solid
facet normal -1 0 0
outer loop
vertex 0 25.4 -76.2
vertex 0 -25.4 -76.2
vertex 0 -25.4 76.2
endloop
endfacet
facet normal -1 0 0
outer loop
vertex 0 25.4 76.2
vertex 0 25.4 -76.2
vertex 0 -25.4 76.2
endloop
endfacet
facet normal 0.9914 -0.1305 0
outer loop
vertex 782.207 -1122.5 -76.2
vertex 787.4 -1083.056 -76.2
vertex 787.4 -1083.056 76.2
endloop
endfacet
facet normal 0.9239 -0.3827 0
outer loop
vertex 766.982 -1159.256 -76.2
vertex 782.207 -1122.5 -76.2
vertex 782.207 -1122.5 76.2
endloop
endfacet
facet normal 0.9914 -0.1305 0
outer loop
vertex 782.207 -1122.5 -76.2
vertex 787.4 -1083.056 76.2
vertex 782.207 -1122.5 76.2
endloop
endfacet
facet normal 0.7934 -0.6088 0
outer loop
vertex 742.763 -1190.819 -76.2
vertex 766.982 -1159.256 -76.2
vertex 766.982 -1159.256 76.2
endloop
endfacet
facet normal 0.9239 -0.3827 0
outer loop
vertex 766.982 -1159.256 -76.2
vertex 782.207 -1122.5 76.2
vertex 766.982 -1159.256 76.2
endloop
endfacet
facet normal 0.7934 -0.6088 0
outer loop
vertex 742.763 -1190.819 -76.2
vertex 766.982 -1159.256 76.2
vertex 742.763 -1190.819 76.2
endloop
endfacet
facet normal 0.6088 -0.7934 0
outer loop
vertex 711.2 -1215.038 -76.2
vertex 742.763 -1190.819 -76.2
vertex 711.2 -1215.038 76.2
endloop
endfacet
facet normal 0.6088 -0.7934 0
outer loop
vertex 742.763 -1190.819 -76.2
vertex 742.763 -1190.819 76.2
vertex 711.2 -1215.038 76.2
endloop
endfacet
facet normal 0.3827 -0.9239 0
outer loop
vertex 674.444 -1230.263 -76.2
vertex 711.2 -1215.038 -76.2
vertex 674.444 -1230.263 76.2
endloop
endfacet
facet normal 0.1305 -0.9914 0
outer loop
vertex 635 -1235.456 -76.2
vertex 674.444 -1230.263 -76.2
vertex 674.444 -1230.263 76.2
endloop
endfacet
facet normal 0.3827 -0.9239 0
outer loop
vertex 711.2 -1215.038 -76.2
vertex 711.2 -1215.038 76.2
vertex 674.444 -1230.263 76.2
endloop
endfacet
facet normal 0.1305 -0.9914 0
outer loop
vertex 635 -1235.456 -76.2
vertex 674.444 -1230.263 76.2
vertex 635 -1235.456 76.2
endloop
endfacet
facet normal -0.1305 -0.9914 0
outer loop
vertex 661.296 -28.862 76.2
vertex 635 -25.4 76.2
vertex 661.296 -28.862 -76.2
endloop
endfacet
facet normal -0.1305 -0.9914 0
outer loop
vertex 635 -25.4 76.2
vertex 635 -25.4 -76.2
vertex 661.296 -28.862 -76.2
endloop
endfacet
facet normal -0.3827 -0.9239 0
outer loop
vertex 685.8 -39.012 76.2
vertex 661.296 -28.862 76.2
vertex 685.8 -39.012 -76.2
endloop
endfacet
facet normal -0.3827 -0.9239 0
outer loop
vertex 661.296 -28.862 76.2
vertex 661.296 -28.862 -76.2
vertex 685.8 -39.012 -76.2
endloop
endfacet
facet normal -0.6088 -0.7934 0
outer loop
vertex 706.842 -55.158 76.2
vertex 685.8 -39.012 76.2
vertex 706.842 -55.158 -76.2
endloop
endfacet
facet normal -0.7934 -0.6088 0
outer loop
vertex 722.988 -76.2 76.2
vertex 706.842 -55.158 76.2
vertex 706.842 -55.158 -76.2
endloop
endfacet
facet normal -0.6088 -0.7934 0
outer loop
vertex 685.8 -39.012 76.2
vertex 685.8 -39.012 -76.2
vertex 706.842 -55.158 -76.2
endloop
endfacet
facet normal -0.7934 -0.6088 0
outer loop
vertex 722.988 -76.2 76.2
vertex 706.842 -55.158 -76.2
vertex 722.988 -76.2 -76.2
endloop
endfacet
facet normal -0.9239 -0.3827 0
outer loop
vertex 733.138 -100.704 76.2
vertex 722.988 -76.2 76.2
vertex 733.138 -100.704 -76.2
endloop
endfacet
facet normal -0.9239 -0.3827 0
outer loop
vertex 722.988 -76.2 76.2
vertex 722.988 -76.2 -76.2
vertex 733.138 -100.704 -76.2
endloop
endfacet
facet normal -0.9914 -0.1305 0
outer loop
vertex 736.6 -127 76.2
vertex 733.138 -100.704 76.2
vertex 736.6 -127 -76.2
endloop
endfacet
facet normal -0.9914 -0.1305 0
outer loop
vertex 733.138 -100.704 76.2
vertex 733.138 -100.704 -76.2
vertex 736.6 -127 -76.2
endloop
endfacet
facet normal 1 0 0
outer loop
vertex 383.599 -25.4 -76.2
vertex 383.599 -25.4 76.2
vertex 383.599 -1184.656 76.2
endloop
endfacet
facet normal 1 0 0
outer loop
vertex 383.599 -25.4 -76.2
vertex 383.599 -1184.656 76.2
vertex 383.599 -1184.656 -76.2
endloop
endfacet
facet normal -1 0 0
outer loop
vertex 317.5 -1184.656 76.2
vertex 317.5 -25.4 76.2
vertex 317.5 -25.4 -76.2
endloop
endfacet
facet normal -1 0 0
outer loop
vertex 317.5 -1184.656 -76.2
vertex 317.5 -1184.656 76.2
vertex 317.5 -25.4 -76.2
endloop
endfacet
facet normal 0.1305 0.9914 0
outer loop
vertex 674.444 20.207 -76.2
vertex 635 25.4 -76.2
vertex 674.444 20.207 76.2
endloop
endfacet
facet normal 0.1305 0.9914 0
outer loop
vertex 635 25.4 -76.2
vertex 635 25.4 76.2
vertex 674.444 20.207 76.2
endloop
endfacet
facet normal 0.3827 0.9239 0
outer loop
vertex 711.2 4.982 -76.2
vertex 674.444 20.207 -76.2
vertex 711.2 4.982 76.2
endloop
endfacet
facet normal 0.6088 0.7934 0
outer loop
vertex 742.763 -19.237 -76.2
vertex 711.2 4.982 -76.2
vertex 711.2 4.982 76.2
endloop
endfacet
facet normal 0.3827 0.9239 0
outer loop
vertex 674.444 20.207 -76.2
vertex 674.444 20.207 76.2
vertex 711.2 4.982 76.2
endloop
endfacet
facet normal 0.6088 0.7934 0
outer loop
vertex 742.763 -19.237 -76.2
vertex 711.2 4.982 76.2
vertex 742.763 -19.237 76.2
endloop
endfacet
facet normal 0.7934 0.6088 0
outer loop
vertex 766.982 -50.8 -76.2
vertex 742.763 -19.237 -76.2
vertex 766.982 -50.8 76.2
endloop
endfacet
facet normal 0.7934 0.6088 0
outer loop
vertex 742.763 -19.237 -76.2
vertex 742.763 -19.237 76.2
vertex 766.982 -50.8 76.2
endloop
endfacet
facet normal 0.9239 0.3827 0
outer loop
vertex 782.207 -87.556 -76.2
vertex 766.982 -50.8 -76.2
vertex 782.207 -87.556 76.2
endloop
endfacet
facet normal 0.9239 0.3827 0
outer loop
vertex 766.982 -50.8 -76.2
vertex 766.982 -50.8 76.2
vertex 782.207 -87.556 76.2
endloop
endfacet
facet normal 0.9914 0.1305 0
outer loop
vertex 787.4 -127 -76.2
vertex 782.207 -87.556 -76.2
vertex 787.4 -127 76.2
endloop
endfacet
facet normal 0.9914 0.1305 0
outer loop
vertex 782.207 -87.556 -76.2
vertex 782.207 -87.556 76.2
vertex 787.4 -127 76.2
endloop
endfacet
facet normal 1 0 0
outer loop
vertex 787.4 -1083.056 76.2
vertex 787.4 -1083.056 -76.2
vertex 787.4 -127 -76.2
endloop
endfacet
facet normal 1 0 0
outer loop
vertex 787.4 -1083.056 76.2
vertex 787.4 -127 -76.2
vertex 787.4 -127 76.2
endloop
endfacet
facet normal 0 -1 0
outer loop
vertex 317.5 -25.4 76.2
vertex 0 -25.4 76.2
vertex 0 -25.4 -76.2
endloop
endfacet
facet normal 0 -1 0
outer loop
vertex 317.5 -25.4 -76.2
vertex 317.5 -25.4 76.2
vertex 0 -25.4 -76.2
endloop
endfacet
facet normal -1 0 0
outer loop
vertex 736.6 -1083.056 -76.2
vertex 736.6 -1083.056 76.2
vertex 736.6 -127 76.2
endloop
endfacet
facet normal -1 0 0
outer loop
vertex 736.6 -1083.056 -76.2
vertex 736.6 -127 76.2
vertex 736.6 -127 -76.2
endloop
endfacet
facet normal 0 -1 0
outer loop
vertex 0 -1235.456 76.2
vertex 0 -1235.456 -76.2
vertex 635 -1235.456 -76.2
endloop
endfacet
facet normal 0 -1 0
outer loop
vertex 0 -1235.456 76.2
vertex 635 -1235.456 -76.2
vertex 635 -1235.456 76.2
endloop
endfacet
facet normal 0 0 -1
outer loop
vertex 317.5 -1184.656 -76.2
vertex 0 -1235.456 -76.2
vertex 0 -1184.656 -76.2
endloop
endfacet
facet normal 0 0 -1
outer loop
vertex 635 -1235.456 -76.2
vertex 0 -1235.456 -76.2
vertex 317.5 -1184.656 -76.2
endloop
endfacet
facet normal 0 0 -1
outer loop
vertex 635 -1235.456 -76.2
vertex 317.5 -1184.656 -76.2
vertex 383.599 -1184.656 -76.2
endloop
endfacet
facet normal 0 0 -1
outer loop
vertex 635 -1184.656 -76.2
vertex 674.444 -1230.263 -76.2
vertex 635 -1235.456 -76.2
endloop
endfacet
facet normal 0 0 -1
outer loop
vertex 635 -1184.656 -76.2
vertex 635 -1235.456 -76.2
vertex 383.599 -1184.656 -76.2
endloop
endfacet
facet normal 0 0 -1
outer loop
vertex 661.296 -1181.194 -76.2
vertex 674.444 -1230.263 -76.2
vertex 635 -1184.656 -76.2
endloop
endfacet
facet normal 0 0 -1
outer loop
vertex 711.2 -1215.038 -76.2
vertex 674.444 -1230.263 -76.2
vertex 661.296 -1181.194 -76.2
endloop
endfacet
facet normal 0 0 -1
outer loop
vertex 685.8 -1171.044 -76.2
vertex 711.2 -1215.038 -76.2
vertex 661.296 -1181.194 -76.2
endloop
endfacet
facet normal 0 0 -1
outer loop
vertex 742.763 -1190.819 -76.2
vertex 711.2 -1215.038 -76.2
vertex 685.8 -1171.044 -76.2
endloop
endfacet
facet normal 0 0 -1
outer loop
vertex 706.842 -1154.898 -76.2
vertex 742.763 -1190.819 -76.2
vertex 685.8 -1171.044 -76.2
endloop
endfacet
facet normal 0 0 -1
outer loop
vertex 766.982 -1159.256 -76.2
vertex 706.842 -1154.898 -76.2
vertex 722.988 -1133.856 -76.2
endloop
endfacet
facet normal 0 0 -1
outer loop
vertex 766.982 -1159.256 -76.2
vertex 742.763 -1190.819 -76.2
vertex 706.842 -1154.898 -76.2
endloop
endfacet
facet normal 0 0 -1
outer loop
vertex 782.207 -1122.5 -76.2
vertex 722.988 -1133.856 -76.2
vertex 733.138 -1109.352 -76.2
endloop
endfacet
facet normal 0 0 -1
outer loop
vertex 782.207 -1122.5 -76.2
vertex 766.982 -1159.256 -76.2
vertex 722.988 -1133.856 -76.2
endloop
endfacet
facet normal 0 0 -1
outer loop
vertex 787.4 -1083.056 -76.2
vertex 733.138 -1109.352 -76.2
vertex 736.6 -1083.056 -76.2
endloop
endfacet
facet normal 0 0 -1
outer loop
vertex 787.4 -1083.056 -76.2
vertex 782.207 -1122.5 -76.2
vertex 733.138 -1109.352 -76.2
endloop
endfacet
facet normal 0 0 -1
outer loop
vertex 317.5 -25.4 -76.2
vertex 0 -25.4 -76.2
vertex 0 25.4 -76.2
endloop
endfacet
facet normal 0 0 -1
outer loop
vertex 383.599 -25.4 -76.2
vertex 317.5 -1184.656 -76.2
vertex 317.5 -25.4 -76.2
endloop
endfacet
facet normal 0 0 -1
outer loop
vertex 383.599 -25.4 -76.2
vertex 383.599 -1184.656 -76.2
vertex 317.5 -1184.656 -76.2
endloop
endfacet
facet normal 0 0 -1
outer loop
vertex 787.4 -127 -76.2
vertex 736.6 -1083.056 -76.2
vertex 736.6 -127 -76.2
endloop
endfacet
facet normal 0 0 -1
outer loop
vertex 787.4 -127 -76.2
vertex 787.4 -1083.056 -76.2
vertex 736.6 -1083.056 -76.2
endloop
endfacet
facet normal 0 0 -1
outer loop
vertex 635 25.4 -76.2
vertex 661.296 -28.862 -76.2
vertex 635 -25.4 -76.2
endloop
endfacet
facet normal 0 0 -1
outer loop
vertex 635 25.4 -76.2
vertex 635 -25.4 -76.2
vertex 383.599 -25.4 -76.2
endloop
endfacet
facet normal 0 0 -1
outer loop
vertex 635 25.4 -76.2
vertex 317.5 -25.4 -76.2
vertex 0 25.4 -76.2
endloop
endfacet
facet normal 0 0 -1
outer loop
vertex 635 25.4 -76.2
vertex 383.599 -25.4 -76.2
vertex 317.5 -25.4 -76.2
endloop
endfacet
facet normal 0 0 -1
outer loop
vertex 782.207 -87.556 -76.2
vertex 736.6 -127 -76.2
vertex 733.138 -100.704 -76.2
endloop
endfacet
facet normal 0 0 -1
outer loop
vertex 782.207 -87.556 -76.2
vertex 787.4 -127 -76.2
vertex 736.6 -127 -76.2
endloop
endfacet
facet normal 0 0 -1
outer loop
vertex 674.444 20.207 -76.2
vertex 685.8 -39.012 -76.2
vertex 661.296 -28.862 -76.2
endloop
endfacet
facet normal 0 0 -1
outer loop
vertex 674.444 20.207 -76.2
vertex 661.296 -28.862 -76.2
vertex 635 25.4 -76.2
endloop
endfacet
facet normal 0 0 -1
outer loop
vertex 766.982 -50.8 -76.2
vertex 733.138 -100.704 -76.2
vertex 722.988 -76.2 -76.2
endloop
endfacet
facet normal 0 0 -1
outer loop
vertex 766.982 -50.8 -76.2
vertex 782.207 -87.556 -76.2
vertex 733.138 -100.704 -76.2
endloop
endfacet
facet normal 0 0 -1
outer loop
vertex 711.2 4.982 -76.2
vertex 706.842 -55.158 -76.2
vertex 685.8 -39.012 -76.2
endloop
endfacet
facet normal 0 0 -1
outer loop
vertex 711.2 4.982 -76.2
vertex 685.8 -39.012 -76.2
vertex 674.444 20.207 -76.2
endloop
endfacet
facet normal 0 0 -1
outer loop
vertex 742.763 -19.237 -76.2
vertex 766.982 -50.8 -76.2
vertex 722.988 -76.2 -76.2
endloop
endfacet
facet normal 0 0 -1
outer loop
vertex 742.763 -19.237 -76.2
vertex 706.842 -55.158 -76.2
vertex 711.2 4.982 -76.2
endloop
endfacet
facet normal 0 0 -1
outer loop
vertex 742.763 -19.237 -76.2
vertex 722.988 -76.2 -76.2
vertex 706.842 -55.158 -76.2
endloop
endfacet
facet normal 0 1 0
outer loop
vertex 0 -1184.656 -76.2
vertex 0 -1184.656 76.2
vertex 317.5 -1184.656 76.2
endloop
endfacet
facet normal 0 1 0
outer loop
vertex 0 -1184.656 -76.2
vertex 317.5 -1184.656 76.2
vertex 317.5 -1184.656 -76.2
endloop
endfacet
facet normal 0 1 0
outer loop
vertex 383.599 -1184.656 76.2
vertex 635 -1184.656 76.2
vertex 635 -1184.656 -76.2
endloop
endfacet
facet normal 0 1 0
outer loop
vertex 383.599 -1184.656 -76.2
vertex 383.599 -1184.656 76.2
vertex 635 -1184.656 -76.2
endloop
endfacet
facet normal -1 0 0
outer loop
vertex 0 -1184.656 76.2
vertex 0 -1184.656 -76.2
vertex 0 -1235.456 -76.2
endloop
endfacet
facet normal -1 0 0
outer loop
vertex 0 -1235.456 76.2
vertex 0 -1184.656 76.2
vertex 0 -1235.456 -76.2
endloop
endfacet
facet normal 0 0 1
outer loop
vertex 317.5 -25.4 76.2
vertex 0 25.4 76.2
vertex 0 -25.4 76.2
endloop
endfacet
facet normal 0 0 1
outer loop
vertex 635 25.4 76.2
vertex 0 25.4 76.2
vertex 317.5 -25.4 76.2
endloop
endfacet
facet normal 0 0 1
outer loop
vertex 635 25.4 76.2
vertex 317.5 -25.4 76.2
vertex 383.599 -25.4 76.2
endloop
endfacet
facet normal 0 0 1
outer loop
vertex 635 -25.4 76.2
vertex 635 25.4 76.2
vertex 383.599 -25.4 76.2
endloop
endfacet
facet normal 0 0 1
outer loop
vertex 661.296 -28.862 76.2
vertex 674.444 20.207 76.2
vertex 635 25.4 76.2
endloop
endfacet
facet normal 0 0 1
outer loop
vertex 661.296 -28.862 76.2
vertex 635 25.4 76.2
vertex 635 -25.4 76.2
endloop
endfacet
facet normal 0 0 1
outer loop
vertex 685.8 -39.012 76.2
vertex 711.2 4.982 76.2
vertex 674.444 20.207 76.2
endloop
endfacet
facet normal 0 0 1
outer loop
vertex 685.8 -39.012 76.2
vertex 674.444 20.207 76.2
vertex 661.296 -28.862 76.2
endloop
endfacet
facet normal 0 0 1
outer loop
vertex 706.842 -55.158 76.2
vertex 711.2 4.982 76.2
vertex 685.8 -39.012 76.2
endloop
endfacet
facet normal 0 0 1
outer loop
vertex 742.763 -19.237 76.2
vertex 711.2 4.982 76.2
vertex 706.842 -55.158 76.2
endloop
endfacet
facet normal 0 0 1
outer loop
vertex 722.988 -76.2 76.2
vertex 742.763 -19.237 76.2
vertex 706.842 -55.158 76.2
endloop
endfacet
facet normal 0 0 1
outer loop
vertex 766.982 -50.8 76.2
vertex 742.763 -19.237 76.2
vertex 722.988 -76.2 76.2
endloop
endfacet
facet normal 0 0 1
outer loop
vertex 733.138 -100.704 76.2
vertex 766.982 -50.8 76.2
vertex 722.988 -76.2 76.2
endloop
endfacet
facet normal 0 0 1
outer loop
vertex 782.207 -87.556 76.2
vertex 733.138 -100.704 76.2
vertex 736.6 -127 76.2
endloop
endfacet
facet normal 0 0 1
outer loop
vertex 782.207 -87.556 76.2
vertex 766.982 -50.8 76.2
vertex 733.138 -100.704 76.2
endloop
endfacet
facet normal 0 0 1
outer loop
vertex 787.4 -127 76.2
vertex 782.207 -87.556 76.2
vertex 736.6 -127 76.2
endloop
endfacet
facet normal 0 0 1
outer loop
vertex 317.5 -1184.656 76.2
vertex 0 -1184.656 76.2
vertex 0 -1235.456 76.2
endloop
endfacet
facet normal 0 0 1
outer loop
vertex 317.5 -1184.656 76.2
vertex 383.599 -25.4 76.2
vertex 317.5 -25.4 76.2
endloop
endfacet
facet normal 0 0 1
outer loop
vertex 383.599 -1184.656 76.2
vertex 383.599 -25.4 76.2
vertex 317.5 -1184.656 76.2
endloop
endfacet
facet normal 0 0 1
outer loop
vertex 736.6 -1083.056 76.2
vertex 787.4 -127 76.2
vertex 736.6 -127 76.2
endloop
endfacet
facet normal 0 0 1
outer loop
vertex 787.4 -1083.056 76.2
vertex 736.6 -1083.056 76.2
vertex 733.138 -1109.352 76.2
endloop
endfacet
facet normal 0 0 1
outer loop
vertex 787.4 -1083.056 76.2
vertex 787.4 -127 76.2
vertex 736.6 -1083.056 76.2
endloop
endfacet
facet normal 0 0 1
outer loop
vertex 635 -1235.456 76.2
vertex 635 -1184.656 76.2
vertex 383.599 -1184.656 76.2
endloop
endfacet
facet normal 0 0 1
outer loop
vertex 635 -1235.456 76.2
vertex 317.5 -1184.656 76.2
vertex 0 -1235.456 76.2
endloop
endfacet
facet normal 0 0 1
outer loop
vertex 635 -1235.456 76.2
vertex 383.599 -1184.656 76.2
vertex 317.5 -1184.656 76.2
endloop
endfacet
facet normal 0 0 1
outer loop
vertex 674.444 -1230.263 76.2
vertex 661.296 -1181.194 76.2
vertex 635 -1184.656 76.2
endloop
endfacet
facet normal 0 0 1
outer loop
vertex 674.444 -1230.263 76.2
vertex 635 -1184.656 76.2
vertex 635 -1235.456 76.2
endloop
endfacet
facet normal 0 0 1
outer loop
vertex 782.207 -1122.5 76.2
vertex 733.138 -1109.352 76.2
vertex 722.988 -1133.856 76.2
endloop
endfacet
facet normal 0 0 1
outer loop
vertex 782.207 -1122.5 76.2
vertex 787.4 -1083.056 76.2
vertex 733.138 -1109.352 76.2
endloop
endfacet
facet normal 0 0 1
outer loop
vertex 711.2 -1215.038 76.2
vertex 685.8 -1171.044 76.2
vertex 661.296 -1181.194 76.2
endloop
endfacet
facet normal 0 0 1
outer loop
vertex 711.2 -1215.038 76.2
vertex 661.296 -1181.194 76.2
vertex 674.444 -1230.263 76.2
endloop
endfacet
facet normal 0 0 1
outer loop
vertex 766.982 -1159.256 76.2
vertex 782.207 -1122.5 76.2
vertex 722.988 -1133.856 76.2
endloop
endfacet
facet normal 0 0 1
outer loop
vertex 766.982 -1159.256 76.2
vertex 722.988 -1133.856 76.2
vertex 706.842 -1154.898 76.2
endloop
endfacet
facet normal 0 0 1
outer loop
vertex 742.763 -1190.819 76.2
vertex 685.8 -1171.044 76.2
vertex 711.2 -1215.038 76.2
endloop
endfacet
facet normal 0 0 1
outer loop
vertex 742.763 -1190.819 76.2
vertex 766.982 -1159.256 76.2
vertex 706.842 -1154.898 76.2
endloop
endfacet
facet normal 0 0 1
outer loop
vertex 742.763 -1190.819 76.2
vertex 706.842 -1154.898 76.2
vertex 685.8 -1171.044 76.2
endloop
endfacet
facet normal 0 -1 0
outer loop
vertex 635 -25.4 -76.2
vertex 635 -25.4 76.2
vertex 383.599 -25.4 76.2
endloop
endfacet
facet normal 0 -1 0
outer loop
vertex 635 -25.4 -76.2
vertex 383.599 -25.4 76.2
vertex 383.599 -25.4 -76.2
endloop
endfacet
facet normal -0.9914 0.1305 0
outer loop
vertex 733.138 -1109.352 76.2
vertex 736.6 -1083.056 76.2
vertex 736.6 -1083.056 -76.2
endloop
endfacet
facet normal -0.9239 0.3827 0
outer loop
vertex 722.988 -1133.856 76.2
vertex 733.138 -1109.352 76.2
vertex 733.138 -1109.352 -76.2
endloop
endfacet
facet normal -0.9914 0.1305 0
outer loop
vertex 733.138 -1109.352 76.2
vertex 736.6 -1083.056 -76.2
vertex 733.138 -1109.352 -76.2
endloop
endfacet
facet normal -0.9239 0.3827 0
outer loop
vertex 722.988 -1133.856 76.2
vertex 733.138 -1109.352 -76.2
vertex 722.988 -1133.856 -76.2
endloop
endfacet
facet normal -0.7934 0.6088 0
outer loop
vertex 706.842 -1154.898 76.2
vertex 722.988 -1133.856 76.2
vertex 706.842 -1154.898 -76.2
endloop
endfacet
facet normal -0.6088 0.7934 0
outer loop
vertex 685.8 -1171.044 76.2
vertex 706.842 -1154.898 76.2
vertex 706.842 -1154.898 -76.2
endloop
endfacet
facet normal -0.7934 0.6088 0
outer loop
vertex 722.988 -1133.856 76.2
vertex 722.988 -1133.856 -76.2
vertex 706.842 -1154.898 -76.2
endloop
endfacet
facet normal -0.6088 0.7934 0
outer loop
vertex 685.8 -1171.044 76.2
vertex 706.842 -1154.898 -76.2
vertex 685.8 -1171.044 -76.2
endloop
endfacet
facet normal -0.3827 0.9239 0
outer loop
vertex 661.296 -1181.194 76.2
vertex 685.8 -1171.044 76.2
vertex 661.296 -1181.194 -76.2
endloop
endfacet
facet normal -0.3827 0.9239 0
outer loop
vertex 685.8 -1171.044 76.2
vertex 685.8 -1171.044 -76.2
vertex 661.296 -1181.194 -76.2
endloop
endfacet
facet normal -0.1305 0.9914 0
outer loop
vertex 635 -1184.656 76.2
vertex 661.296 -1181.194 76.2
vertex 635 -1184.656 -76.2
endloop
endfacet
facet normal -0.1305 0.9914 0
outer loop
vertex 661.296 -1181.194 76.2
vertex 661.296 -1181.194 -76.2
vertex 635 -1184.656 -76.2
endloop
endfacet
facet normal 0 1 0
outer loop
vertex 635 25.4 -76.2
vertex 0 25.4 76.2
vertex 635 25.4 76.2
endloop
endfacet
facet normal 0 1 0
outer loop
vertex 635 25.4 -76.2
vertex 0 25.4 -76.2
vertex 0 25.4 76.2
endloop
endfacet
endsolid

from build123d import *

# Parameters (mm, degrees)
SKETCH2_W           = 152.4
SKETCH2_H           = 50.8
SKETCH3_W           = 66.098972621
SKETCH3_H           = 152.4
BOSS_EXTRUDE1_DEPTH = 1229.106


with BuildPart() as part:
    # Sweep1: sweep along a path in Sketch1
    with BuildLine(Plane.XY) as sweep1_path:
        Line((0, 0), (635, 0))
        ThreePointArc((635, 0), (724.802561211, -37.197438789), (762, -127))
        Line((762, -127), (762, -1083.056))
        ThreePointArc((762, -1083.056), (724.802561211, -1172.858561211), (635, -1210.056))
        Line((635, -1210.056), (0, -1210.056))
    # Sketch2 → Sweep1 (sweep)
    with BuildSketch(Plane(origin=(0, 0, 0), x_dir=(0, 0, -1), z_dir=(1, 0, 0))):
        Rectangle(SKETCH2_W, SKETCH2_H)
    sweep(path=sweep1_path.line)

    # Sketch3 → Boss-Extrude1 (add)
    with BuildSketch(Plane(origin=(0, 25.4, 0), x_dir=(1, 0, 0), z_dir=(0, 1, 0))):
        with Locations((350.549486311, 0)):
            Rectangle(SKETCH3_W, SKETCH3_H)
    extrude(amount=-BOSS_EXTRUDE1_DEPTH)


solid = part.part
